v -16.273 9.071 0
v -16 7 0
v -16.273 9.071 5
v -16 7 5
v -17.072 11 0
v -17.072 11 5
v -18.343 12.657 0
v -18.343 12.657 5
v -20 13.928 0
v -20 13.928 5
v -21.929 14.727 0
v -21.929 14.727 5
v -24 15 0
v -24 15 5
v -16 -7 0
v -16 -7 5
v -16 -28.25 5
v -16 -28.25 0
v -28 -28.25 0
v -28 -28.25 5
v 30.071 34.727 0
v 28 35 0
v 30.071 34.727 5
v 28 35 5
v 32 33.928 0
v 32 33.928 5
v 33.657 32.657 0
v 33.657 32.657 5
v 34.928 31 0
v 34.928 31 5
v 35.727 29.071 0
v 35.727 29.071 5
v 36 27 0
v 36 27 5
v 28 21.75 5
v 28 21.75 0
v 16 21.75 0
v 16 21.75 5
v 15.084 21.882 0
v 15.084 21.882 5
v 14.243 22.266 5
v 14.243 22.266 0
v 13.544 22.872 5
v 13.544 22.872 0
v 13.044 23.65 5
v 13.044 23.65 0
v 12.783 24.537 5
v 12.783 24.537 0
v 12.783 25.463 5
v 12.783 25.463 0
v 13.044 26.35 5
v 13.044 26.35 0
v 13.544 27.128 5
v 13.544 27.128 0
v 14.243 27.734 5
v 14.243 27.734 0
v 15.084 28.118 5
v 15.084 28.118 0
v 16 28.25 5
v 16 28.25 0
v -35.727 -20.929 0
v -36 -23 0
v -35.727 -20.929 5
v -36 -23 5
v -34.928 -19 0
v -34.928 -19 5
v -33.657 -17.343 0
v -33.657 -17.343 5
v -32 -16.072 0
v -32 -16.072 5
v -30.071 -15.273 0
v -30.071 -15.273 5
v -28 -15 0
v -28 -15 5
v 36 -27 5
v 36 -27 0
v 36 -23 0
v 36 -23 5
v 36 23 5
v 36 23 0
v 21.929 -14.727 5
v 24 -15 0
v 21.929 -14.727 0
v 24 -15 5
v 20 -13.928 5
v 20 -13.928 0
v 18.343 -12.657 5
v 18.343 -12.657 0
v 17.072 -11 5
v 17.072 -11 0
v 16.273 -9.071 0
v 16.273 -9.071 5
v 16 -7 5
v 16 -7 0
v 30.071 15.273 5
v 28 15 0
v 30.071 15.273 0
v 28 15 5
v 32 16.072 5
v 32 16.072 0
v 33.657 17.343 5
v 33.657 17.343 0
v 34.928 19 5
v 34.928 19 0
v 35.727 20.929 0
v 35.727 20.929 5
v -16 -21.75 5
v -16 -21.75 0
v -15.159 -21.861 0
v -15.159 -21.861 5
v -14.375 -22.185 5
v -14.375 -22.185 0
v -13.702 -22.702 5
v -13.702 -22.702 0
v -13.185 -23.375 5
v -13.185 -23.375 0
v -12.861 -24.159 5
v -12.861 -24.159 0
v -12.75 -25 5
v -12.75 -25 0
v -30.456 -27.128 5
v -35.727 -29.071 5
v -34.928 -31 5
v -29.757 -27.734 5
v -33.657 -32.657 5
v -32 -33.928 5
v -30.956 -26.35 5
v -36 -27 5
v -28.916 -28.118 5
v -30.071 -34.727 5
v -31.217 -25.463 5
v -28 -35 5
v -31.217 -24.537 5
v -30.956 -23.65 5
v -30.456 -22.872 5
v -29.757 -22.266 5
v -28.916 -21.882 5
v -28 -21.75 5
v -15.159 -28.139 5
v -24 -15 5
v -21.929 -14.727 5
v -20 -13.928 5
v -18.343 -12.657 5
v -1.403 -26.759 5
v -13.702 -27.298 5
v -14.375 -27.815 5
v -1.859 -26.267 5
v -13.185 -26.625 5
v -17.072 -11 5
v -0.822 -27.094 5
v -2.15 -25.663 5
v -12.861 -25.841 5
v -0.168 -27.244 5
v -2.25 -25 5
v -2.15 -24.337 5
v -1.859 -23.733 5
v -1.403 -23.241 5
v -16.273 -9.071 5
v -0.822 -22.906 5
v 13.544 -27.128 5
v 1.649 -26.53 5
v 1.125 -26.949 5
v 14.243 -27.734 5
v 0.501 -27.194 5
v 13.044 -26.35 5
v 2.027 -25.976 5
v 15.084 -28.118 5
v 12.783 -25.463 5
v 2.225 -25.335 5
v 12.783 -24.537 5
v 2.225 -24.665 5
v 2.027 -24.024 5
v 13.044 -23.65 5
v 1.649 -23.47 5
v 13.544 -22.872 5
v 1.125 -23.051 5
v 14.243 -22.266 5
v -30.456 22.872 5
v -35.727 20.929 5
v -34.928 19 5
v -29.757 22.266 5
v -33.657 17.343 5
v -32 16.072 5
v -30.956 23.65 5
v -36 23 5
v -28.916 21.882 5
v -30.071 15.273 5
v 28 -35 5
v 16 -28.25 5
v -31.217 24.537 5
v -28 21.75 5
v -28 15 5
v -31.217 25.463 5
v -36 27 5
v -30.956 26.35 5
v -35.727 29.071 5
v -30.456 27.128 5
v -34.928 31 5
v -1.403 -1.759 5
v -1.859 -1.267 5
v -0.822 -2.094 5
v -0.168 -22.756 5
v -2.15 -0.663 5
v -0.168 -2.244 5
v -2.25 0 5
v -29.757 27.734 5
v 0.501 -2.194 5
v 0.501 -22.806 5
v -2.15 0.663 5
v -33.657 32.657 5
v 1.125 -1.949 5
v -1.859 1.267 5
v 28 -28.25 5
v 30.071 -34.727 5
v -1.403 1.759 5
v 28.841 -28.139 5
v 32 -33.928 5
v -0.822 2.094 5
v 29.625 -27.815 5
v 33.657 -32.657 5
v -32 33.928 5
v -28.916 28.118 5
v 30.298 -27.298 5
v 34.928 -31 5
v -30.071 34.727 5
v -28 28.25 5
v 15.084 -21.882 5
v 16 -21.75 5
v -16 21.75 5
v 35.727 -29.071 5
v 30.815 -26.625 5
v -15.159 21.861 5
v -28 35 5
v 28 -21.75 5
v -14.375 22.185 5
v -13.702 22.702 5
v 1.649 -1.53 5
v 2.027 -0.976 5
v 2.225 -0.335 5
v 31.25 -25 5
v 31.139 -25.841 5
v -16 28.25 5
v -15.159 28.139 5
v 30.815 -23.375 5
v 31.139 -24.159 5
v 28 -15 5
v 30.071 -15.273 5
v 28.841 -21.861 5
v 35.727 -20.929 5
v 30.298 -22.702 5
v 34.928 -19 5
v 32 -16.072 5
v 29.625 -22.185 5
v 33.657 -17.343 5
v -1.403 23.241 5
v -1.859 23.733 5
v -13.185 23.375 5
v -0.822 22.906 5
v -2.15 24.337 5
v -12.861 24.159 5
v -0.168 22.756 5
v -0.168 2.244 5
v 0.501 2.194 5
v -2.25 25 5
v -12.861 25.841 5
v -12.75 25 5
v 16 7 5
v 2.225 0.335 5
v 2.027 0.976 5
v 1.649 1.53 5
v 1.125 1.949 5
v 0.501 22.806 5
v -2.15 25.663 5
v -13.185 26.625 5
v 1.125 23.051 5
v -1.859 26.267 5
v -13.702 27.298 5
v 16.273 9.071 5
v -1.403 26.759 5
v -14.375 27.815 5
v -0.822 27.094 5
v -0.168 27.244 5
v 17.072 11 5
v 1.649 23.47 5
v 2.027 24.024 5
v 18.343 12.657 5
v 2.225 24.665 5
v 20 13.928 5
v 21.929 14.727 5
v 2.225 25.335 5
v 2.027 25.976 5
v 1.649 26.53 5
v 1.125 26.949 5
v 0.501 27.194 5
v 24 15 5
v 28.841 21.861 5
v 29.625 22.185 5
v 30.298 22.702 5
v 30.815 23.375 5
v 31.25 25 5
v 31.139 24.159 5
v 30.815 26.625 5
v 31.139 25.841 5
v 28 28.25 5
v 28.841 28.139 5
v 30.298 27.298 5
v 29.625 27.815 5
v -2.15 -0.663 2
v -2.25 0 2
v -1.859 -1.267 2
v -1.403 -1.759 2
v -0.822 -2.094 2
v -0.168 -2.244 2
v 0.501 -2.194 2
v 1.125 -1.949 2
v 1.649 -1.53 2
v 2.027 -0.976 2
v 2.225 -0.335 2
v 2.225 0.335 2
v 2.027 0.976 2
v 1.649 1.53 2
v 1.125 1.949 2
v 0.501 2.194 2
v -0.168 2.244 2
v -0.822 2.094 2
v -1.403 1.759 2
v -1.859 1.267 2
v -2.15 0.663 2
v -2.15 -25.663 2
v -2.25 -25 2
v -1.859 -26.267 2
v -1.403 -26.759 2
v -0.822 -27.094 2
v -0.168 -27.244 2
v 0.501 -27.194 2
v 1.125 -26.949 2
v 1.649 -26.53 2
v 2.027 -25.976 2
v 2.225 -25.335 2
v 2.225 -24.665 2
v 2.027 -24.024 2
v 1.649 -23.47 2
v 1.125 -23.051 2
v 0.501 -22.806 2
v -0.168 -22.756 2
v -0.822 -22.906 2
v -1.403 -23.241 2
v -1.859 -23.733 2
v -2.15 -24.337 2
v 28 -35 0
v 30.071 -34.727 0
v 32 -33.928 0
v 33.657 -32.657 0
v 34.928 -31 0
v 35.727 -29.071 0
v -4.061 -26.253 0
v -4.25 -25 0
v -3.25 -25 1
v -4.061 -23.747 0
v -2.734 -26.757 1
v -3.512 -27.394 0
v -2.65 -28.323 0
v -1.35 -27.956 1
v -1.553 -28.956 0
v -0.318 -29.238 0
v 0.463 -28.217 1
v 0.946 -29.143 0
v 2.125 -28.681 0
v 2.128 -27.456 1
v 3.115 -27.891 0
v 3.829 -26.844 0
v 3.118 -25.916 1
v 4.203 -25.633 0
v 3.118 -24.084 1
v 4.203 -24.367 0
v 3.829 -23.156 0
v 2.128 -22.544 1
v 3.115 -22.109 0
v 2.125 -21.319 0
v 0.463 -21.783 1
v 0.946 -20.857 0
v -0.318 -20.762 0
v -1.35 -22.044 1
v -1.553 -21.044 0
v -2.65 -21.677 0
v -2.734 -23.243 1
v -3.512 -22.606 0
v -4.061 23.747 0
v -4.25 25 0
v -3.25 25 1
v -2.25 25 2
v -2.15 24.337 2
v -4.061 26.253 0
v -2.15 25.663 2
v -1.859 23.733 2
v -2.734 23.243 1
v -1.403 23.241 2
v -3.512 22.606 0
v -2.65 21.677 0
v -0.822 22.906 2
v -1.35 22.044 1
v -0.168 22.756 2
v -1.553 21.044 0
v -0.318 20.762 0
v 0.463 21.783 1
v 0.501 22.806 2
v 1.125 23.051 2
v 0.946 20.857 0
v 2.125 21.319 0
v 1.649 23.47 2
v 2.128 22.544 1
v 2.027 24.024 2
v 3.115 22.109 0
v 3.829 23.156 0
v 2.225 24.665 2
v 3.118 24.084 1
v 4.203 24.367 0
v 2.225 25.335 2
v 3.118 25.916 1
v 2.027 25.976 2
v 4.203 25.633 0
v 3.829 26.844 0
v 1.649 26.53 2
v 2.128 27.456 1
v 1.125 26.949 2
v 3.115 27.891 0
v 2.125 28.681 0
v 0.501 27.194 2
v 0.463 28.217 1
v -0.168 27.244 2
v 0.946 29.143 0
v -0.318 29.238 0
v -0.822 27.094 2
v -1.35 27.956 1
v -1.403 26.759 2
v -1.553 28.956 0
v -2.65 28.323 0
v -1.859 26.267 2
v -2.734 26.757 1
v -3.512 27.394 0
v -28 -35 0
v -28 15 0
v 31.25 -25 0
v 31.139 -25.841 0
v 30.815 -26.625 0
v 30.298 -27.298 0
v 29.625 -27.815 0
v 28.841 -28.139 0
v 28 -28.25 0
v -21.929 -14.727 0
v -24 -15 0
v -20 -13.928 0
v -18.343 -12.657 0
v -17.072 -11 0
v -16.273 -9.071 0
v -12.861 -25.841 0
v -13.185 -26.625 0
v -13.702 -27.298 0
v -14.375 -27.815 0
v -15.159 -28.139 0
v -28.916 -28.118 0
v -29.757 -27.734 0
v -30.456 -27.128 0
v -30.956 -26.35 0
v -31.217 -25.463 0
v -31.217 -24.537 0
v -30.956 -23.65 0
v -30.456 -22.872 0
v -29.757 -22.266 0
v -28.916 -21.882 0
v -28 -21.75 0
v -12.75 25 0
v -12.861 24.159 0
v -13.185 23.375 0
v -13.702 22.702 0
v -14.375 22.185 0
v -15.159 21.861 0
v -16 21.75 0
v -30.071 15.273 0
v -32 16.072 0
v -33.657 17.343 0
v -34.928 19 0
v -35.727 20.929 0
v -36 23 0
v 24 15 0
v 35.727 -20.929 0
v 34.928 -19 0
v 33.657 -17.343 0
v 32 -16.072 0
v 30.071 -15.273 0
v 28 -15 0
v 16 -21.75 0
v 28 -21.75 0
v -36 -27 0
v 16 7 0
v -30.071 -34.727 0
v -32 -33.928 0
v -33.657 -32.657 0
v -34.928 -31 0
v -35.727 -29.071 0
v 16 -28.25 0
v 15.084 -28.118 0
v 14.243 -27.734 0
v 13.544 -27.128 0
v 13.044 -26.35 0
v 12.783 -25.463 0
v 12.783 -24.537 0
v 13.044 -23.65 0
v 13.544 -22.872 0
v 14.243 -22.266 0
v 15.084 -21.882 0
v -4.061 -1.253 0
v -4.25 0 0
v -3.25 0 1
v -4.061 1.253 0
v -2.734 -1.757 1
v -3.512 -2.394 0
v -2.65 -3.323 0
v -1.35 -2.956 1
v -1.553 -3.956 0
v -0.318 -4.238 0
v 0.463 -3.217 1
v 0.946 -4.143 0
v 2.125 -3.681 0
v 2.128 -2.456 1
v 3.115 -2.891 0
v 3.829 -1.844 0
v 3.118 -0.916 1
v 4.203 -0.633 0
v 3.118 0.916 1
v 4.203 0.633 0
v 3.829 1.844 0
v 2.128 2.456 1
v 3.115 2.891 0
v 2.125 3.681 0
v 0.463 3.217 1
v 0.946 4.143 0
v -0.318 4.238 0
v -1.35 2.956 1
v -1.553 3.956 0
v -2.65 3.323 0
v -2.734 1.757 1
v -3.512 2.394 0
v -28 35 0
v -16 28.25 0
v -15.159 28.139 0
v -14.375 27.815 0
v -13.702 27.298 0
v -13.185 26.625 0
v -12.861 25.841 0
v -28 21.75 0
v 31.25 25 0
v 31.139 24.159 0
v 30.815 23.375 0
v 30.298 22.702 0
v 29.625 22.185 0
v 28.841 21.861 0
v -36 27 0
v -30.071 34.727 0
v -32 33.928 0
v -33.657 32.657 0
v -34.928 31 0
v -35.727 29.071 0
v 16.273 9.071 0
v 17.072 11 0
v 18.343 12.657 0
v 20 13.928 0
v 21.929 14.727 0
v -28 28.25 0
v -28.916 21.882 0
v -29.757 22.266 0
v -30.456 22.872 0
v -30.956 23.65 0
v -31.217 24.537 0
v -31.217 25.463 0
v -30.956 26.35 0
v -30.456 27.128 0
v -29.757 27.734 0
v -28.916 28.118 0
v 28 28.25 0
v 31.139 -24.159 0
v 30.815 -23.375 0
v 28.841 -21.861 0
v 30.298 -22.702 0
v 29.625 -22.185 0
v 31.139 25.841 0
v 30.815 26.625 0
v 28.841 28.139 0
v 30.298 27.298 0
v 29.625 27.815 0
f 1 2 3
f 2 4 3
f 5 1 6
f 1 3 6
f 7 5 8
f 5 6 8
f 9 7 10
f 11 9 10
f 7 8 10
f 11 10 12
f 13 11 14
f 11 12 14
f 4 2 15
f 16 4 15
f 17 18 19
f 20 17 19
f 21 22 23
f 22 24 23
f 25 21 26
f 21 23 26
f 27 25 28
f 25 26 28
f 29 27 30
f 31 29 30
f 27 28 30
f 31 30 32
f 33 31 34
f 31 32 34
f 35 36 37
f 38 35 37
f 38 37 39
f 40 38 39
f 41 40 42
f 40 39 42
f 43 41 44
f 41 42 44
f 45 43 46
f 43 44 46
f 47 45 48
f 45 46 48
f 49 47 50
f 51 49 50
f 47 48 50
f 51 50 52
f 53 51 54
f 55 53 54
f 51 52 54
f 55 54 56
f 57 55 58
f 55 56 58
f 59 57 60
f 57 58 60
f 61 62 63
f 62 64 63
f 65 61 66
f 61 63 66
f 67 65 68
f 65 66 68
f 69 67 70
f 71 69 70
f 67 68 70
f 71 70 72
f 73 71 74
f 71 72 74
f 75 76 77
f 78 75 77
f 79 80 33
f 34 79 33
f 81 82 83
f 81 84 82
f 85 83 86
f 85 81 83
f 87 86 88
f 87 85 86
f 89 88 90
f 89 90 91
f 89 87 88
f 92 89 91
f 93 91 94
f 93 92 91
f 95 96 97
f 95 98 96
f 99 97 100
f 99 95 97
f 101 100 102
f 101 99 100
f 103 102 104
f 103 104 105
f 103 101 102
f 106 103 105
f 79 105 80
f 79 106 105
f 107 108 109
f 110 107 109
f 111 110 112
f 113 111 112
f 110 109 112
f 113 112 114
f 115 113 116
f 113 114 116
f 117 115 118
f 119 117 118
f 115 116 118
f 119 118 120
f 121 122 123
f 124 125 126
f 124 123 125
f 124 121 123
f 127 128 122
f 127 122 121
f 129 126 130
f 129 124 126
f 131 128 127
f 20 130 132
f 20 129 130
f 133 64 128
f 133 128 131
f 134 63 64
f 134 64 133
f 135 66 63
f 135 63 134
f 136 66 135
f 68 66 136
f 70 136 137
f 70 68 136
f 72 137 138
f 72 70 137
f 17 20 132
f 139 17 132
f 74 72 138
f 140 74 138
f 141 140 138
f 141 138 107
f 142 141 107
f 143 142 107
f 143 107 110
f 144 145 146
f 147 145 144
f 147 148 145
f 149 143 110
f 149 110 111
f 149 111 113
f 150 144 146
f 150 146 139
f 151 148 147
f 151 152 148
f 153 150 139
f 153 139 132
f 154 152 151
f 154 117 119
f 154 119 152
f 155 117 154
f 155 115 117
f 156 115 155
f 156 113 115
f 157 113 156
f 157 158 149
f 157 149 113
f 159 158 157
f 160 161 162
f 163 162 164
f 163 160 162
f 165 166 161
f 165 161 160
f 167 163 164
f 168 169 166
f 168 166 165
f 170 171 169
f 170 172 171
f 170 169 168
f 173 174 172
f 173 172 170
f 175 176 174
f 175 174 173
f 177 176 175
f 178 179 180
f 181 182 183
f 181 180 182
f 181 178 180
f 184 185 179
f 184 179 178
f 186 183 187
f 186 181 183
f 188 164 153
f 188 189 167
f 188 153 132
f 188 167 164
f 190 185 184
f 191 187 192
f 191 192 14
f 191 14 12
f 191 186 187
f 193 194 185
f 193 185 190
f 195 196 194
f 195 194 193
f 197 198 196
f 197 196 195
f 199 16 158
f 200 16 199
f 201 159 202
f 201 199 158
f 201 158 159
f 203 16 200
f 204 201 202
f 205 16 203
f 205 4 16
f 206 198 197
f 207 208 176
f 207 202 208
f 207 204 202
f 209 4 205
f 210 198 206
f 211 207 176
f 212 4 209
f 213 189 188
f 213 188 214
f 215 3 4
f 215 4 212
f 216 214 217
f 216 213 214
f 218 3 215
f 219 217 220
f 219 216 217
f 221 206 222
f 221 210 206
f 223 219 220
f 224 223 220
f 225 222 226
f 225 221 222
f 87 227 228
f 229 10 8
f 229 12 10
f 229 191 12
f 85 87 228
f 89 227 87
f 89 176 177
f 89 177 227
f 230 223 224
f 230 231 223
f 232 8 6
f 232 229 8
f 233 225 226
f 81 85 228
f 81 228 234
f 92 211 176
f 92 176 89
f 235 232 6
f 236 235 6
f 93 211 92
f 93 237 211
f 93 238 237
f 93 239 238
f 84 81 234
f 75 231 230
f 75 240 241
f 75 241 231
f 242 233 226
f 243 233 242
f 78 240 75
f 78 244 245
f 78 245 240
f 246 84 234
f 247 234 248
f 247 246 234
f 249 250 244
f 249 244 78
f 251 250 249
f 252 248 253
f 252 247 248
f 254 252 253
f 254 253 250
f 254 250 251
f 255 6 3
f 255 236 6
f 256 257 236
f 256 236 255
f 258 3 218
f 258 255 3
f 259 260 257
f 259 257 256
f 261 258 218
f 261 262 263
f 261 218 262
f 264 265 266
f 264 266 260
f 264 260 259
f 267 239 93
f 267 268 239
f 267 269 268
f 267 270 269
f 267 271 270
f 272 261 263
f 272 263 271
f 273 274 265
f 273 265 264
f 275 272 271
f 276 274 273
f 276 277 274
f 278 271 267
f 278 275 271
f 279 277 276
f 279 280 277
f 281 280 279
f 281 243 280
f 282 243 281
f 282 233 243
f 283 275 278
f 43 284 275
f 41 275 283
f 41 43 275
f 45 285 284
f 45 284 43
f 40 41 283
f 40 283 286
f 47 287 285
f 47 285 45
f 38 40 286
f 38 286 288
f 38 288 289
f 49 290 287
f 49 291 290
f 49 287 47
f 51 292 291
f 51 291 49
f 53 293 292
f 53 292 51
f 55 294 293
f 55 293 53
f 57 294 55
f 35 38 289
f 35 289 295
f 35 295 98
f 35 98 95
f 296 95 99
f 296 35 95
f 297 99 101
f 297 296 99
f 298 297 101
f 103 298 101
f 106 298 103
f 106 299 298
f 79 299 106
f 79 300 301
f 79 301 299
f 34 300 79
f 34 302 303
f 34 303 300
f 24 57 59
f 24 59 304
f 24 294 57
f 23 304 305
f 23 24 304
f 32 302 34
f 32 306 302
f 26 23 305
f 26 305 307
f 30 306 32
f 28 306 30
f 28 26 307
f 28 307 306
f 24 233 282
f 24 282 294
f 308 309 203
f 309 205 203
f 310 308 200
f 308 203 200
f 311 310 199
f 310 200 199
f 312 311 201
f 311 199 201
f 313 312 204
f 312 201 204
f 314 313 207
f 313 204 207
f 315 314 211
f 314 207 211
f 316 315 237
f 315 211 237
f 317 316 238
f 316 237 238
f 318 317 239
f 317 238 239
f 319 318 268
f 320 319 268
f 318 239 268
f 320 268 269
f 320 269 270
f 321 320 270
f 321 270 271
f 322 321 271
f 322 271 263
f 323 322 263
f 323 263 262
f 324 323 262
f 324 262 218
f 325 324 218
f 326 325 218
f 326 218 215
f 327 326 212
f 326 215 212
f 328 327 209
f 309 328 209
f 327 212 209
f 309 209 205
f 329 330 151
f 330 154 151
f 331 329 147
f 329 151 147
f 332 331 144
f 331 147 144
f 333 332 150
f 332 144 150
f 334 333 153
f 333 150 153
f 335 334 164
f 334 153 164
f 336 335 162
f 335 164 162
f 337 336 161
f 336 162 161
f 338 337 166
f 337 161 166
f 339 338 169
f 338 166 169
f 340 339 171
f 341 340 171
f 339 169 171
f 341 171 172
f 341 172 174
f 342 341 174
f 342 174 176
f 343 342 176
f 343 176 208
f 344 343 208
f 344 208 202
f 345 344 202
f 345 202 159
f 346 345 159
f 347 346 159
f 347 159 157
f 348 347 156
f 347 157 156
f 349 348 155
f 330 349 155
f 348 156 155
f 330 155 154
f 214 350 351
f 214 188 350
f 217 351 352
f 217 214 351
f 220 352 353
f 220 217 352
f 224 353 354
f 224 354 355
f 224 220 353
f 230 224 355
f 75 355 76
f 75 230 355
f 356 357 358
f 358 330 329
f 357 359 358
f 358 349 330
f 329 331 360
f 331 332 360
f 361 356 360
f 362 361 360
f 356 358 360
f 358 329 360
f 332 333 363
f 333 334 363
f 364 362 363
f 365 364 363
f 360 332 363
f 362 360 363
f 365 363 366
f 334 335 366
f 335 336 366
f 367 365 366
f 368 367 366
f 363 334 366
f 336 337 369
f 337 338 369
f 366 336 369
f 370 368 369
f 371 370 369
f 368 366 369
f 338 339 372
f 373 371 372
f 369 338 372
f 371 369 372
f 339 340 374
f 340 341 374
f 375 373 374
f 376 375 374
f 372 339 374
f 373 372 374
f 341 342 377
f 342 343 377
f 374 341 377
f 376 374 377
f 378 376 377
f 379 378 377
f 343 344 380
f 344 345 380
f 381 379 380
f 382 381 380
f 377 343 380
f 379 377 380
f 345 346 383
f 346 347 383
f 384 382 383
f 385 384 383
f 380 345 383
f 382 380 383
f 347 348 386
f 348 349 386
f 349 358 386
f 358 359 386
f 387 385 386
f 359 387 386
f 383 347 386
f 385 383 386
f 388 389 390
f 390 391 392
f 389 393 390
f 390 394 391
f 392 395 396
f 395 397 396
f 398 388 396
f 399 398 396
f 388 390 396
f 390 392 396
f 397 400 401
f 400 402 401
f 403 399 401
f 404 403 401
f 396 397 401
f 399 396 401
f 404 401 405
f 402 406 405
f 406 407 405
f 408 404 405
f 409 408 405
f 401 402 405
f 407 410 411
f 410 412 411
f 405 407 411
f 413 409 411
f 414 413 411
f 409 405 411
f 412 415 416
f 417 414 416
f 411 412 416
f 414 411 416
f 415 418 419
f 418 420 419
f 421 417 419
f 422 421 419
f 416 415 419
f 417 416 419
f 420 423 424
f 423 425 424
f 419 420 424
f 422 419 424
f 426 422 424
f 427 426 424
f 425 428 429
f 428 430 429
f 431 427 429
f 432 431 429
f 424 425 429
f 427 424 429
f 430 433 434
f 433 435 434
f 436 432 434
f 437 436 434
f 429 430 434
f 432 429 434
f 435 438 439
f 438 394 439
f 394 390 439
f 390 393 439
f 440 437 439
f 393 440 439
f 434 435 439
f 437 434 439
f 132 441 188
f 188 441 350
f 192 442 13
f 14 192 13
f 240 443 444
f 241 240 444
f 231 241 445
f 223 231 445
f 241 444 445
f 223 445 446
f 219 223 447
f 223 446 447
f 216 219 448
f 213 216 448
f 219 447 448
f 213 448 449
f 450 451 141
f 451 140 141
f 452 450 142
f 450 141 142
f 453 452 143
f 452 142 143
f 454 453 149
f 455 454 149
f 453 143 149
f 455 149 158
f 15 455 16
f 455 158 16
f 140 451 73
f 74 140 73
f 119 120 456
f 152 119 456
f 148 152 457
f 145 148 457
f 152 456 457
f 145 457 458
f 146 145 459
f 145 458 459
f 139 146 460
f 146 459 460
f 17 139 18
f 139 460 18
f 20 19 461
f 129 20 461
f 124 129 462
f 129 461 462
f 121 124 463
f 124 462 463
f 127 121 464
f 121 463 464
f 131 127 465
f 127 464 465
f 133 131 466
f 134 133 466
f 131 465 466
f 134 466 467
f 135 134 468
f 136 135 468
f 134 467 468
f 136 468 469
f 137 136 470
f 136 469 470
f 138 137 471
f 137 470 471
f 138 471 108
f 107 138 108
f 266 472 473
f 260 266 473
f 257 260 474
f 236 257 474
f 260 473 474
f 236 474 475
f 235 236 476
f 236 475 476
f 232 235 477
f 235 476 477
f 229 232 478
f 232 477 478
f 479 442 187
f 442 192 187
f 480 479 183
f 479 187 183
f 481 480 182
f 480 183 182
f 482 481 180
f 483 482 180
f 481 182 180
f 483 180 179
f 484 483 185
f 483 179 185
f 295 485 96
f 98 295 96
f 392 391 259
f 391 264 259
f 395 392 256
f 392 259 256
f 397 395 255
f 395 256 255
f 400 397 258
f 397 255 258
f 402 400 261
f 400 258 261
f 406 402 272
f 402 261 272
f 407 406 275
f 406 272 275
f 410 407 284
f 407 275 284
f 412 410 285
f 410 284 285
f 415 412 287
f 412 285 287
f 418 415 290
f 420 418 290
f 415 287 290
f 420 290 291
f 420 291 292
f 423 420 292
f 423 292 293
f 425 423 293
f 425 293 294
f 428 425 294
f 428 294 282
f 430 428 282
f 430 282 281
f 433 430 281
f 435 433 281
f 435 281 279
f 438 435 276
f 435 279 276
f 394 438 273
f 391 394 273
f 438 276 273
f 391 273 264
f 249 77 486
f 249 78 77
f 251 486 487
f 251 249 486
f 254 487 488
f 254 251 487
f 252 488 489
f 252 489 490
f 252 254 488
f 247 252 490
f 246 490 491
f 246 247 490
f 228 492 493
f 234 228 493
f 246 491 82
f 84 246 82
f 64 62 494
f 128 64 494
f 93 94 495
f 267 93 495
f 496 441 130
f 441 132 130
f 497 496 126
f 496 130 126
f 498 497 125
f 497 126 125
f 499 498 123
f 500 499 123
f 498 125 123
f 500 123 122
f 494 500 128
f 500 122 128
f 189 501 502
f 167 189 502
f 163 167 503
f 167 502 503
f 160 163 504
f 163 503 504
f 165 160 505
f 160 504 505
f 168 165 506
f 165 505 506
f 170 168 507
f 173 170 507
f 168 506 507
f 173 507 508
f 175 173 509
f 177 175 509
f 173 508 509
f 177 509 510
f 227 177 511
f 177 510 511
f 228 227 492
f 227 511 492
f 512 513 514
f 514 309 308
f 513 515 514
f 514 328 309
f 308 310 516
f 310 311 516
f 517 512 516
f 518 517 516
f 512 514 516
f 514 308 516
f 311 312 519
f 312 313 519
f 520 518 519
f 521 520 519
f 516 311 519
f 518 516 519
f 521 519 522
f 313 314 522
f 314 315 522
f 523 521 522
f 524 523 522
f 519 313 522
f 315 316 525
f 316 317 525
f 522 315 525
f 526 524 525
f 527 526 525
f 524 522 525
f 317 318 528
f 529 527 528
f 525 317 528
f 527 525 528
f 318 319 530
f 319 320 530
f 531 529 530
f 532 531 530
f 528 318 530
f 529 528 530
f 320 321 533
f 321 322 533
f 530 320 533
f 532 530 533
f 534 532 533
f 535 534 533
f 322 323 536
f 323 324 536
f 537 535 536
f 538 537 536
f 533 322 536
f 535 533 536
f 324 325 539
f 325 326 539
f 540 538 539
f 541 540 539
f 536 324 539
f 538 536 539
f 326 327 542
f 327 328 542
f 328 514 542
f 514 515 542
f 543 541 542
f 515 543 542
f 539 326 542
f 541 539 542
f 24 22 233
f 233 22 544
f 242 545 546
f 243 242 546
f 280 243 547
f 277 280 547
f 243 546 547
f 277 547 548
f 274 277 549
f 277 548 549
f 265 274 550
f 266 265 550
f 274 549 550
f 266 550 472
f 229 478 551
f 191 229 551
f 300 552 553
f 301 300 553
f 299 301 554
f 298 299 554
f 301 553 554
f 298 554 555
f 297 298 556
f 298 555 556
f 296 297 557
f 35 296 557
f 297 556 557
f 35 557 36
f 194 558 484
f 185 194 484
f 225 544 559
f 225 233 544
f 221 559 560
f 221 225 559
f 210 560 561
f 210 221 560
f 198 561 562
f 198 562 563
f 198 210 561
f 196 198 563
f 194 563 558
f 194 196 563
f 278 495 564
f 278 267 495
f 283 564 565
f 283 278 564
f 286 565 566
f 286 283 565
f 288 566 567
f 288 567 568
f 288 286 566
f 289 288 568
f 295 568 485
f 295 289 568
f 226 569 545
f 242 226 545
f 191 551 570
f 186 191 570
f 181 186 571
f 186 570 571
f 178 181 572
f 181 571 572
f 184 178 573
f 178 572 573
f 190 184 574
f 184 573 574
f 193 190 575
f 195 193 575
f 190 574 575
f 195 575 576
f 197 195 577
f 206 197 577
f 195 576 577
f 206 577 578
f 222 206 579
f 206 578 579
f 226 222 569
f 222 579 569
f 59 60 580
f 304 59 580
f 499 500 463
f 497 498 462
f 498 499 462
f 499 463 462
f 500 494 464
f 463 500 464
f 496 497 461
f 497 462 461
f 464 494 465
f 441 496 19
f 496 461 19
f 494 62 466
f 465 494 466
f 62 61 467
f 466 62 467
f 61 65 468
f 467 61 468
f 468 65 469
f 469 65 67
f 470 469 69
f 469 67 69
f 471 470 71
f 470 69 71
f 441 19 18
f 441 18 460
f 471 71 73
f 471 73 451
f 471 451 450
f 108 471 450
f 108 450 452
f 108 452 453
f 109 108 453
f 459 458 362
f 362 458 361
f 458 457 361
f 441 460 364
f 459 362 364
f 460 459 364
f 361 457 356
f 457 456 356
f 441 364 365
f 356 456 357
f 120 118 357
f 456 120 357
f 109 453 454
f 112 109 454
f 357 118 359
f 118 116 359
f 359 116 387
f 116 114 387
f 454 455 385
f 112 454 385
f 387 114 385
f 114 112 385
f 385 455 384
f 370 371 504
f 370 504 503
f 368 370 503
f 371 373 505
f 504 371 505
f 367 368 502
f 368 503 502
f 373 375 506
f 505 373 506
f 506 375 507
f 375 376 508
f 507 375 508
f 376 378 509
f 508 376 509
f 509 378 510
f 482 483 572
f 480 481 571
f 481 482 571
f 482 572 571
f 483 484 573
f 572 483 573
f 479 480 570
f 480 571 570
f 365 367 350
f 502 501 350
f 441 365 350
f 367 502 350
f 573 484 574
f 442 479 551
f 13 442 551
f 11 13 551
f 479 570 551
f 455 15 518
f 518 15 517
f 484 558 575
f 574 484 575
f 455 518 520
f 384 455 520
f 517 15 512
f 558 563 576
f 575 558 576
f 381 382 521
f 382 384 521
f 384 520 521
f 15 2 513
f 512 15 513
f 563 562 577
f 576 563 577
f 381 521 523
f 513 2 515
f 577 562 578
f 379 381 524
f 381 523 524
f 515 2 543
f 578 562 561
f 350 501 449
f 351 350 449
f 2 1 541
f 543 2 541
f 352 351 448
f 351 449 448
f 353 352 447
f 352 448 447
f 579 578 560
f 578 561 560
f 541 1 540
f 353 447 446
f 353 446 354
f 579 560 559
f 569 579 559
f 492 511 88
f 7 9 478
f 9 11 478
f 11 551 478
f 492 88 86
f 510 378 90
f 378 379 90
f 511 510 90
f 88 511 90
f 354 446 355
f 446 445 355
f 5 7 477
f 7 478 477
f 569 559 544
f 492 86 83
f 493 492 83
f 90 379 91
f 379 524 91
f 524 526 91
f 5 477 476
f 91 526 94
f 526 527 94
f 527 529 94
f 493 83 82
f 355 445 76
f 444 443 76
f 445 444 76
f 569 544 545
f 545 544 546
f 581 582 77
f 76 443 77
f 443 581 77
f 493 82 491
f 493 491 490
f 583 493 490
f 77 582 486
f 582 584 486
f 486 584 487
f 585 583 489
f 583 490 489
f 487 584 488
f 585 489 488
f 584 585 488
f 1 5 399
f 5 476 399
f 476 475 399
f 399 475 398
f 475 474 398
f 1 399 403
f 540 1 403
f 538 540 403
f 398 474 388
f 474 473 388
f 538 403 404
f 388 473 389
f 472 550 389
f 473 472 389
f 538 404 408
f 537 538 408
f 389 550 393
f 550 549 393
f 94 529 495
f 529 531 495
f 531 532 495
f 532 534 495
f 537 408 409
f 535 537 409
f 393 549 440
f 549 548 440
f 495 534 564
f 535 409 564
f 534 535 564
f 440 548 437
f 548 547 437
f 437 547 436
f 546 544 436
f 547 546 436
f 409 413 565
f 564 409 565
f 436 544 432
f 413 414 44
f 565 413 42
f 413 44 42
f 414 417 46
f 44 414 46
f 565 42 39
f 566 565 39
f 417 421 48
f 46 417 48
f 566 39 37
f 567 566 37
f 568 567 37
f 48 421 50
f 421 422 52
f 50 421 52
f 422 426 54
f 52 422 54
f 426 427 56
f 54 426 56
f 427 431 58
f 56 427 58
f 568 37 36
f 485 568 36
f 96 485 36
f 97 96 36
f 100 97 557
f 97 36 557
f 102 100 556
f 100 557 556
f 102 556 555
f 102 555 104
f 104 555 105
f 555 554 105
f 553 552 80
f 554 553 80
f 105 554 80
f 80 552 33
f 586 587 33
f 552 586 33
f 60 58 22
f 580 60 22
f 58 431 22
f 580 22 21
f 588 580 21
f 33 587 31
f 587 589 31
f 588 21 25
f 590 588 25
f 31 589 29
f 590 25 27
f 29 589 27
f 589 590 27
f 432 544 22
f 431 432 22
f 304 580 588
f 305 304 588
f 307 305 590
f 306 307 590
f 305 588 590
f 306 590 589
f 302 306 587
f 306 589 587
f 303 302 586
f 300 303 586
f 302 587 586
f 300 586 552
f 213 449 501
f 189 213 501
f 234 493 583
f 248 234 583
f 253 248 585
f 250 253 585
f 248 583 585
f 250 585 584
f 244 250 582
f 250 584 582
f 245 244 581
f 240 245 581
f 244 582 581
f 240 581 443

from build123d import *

# Parameters (mm, degrees)
F2_DEPTH       = 5
F3_D           = 4.5
F3_CSINK_D     = 8.5
F3_CSINK_ANGLE = 90
F4_R           = 8


with BuildPart() as f2:
    # F1 (on Top) → F2 (new body)
    with BuildSketch(Plane.XY):
        Polygon((36, 35), (-36, 35), (-36, 15), (-16, 15), (-16, -15), (-36, -15), (-36, -35), (36, -35), (36, -15), (16, -15), (16, 15), (36, 15), align=None)
        with BuildLine():
            ThreePointArc((-16, -21.75), (-13.701903, -22.701903), (-12.75, -25))
            ThreePointArc((-12.75, -25), (-13.701903, -27.298097), (-16, -28.25))
            Line((-16, -28.25), (-28, -28.25))
            ThreePointArc((-28, -28.25), (-31.25, -25), (-28, -21.75))
            Line((-28, -21.75), (-16, -21.75))
        make_face(mode=Mode.SUBTRACT)
        with BuildLine():
            ThreePointArc((16, -28.25), (12.75, -25), (16, -21.75))
            Line((16, -21.75), (28, -21.75))
            ThreePointArc((28, -21.75), (30.298097, -22.701903), (31.25, -25))
            ThreePointArc((31.25, -25), (30.298097, -27.298097), (28, -28.25))
            Line((28, -28.25), (16, -28.25))
        make_face(mode=Mode.SUBTRACT)
        with BuildLine():
            ThreePointArc((-16, 28.25), (-13.701903, 27.298097), (-12.75, 25))
            ThreePointArc((-12.75, 25), (-13.701903, 22.701903), (-16, 21.75))
            Line((-16, 21.75), (-28, 21.75))
            ThreePointArc((-28, 21.75), (-31.25, 25), (-28, 28.25))
            Line((-28, 28.25), (-16, 28.25))
        make_face(mode=Mode.SUBTRACT)
        with BuildLine():
            ThreePointArc((16, 21.75), (12.75, 25), (16, 28.25))
            Line((16, 28.25), (28, 28.25))
            ThreePointArc((28, 28.25), (30.298097, 27.298097), (31.25, 25))
            ThreePointArc((31.25, 25), (30.298097, 22.701903), (28, 21.75))
            Line((28, 21.75), (16, 21.75))
        make_face(mode=Mode.SUBTRACT)
    extrude(amount=F2_DEPTH)

    # F3 (through all)
    with Locations(Plane(origin=(0, 0, 0), x_dir=(1, 0, 0), z_dir=(0, 0, -1))):
        with Locations((0, 25), (0, 0), (0, -25)):
            CounterSinkHole(F3_D / 2, F3_CSINK_D / 2, counter_sink_angle=F3_CSINK_ANGLE)

    # F4
    f4_edges = [f2.edges().sort_by_distance(p)[0] for p in [
        (-36, 35, 2.5),
        (-36, -15, 2.5),
        (-36, -35, 2.5),
        (36, -15, 2.5),
        (36, -35, 2.5),
        (36, 15, 2.5),
        (36, 35, 2.5),
        (-16, -15, 2.5),
        (-16, 15, 2.5),
        (16, 15, 2.5),
        (16, -15, 2.5),
        (-36, 15, 2.5),
    ]]
    fillet(f4_edges, radius=F4_R)


solid = f2.part
